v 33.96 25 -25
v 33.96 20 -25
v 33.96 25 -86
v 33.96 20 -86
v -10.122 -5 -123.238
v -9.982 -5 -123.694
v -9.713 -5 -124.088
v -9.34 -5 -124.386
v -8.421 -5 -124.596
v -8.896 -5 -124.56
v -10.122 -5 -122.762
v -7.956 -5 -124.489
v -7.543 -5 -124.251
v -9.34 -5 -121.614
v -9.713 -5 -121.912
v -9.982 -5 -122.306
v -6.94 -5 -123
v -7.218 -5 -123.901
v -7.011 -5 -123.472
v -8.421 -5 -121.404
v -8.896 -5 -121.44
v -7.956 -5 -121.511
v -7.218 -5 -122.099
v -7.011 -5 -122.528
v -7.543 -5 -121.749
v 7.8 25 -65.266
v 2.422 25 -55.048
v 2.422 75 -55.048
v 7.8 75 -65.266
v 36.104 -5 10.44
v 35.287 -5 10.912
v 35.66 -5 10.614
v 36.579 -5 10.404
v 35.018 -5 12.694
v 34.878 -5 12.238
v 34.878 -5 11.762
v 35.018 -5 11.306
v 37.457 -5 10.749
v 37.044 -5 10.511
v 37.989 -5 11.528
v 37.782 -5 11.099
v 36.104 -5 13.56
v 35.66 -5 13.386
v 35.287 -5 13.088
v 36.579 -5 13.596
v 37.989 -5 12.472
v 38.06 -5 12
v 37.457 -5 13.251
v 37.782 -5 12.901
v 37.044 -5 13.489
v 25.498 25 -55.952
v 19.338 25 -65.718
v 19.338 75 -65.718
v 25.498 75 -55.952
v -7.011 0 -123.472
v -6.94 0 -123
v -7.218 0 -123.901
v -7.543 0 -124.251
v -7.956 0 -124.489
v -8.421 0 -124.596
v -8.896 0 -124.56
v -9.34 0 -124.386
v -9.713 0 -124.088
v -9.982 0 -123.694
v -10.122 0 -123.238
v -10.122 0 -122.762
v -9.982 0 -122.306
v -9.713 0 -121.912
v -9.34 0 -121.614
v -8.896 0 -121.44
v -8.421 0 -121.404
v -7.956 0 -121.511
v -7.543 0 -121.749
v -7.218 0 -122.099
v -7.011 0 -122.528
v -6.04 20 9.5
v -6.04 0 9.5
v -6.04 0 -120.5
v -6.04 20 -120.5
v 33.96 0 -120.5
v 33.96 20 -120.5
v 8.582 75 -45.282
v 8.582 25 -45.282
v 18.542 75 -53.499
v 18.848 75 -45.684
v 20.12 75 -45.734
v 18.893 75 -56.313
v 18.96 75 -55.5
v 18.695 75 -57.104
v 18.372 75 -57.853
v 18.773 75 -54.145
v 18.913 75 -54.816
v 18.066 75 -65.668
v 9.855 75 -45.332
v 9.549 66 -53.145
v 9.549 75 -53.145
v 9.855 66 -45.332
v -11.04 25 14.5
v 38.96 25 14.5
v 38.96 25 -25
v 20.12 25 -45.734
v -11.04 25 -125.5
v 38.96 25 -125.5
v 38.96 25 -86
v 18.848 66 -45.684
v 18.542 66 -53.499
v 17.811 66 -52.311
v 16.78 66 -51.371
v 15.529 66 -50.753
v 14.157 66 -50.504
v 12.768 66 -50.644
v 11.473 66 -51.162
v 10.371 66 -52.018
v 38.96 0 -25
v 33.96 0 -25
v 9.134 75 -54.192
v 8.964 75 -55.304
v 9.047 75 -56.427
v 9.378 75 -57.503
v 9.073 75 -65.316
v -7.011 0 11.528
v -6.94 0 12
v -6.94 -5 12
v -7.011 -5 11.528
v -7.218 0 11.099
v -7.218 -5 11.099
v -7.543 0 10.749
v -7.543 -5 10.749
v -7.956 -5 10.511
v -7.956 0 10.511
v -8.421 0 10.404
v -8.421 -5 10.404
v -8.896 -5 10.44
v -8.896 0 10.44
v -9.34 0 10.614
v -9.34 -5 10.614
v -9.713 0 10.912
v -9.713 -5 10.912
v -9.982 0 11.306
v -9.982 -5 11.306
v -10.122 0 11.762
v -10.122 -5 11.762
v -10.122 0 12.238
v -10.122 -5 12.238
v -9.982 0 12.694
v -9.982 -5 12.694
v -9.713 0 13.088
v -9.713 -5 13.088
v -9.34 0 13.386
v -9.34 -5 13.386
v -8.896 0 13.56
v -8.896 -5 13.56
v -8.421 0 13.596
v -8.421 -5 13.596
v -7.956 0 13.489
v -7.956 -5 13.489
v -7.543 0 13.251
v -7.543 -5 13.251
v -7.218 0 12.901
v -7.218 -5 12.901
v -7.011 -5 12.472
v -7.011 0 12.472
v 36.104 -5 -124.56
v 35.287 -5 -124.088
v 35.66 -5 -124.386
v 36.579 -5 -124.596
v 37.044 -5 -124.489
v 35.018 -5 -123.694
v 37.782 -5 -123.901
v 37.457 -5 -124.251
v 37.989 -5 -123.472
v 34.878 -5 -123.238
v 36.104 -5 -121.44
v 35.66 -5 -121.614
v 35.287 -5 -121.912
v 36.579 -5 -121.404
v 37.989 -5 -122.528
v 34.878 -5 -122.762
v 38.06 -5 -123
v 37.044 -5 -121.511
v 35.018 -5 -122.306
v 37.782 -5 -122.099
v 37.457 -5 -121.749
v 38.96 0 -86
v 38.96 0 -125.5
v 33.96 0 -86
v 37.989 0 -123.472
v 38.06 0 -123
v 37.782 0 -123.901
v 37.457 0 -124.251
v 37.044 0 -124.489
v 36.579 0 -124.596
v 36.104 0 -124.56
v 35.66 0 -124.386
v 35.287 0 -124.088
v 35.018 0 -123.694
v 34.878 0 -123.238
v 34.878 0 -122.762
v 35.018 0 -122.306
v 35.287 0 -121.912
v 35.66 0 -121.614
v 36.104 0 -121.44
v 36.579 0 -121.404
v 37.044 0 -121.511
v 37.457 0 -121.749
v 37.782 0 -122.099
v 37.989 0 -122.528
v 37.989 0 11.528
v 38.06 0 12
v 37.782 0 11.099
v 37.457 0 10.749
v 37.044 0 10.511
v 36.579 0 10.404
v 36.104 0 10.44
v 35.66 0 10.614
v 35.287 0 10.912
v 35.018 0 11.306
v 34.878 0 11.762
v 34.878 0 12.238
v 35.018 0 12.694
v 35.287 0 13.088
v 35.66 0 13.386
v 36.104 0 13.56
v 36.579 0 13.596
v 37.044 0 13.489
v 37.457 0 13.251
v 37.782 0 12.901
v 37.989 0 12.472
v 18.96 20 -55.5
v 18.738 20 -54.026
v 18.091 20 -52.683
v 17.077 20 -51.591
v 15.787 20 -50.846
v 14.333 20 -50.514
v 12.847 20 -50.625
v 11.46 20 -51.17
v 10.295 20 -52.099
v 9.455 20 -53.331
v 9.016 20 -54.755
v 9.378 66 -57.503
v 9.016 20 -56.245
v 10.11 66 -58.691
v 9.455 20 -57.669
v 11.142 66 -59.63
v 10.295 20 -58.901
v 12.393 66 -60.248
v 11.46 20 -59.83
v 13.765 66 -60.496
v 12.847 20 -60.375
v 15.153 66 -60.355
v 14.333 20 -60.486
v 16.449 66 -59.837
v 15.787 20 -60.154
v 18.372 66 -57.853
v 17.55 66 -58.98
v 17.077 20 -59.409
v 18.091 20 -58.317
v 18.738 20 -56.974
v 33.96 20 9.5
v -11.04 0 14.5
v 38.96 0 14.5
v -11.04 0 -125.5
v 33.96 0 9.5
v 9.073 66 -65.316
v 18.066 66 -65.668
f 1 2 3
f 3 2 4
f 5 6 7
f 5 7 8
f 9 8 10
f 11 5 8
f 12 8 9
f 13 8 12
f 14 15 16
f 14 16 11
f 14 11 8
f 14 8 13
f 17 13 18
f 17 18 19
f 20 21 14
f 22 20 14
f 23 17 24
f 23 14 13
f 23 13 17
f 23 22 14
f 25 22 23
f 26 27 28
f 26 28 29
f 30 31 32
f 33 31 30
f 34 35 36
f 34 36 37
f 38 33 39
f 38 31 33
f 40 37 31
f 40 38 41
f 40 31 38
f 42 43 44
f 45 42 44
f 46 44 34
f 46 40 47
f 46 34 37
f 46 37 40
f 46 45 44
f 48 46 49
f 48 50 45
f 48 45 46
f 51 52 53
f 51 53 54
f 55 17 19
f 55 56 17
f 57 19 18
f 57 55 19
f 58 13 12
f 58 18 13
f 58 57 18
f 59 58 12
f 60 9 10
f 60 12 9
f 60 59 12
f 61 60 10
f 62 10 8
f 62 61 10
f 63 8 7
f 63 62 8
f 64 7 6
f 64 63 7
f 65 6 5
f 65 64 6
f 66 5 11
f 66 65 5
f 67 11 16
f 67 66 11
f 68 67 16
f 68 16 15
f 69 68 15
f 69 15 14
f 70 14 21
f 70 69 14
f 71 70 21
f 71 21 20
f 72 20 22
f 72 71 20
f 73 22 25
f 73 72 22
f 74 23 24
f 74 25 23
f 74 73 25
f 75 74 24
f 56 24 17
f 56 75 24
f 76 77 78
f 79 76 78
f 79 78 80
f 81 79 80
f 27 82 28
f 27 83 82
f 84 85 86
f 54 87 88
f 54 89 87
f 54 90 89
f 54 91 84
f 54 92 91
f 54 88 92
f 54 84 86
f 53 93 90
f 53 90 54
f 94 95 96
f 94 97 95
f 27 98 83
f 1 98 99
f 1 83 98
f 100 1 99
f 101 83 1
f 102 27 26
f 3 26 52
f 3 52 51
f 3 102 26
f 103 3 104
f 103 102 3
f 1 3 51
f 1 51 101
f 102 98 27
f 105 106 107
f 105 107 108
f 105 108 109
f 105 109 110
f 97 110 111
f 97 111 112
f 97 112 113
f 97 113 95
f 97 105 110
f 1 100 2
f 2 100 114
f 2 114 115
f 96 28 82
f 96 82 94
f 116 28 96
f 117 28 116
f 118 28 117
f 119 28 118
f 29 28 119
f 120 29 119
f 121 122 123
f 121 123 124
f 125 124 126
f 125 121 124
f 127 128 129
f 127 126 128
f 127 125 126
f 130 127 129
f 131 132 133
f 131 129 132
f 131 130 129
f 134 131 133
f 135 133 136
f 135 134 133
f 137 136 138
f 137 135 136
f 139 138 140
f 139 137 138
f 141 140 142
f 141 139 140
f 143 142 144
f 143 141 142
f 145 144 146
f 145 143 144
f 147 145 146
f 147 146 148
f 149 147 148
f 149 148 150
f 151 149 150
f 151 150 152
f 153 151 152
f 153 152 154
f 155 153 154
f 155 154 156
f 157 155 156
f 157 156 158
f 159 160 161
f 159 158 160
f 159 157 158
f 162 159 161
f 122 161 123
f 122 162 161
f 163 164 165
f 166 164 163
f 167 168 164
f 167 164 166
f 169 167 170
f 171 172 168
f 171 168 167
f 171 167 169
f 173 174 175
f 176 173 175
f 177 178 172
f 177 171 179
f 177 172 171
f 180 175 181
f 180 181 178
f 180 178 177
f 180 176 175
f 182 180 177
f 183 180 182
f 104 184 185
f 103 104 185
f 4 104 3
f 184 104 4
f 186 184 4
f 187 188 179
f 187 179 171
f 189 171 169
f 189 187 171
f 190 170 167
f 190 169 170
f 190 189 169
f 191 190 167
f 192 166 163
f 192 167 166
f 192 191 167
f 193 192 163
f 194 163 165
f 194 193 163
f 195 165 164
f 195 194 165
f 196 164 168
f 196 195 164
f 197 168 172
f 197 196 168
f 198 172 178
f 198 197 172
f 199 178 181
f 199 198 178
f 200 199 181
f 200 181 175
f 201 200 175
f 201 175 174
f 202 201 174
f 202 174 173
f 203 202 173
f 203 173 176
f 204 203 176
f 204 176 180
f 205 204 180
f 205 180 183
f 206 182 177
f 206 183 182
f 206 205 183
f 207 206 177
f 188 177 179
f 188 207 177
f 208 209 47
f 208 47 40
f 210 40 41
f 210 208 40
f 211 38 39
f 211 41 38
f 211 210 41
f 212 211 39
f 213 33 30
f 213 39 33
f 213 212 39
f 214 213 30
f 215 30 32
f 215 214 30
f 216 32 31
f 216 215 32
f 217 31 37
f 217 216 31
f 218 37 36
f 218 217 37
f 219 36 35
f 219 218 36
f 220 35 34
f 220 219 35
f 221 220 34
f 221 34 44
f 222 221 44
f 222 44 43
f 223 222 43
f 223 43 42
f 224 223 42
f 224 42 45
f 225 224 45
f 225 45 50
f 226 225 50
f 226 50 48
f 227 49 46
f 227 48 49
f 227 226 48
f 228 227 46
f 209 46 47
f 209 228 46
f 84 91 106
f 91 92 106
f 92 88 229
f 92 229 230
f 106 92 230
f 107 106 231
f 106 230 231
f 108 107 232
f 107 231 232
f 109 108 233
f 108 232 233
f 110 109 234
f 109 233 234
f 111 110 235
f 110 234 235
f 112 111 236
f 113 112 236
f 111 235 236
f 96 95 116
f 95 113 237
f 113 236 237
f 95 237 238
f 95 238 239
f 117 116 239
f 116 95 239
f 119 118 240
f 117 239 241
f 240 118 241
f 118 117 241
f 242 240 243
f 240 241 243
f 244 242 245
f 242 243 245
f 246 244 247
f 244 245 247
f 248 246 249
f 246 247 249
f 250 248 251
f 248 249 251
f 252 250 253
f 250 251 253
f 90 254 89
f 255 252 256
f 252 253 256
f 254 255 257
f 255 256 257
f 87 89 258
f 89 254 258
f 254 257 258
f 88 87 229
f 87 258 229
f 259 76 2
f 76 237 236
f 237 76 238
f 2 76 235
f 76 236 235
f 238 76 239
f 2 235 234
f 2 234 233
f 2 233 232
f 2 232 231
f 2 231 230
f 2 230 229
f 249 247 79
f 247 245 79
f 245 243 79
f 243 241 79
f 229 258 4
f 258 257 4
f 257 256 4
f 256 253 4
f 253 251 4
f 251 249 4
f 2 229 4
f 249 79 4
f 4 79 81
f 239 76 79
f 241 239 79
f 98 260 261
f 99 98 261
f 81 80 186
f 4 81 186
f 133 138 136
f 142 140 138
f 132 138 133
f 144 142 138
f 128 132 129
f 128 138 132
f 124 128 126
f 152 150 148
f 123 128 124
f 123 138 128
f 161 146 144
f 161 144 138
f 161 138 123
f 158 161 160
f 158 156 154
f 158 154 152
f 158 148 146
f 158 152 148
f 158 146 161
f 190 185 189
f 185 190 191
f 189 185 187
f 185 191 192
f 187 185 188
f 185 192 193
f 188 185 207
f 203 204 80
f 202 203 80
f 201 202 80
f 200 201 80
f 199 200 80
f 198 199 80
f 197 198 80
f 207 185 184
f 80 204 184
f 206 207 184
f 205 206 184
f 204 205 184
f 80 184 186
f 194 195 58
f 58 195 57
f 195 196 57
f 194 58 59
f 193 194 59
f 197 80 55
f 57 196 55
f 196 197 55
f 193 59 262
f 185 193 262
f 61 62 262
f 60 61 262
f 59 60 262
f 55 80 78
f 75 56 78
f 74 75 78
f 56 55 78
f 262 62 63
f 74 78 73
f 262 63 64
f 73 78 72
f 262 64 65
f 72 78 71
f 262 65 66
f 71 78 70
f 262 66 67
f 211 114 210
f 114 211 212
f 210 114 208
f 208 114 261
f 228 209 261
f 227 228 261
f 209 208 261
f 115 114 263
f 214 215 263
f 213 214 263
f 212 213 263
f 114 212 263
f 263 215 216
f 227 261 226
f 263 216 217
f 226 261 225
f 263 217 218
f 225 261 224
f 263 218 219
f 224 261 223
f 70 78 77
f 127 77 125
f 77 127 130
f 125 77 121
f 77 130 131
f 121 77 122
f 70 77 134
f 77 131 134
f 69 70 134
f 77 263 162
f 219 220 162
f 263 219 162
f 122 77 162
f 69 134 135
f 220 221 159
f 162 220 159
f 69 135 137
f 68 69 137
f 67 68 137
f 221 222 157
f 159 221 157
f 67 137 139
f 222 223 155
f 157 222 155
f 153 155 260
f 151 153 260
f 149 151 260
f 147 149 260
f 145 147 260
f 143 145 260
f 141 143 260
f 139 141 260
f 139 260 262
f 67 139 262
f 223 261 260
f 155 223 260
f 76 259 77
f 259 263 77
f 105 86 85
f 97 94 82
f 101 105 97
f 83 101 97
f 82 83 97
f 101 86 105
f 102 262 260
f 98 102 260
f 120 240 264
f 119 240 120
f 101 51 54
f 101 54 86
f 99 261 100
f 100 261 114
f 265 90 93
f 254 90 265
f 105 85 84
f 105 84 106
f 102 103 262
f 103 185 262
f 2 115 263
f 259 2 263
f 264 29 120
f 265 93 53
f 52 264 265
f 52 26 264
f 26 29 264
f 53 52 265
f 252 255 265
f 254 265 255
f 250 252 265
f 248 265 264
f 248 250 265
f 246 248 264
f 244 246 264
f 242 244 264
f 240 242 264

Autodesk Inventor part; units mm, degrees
ref_plane "YZ Plane" through (0, 0, 0) normal (1, 0, 0) x (0, 1, 0)
ref_plane "XZ Plane" through (0, 0, 0) normal (0, 1, 0) x (-1, 0, 0)
ref_plane "XY Plane" through (0, 0, 0) normal (0, 0, 1) x (1, 0, 0)
sketch "Sketch1" plane through (0, 0, 0) normal (0, 1, 0) x (-1, 0, 0)
  point P0 (0, 0)
sketch "Sketch2" plane through (0, 0, 0) normal (0, 1, 0) x (-1, 0, 0)
  line L0 (11.0402, 14.5) -> (-38.9598, 14.5)
  line L1 (-38.9598, -125.5) -> (11.0402, -125.5)
  line L2 (11.0402, -125.5) -> (11.0402, 14.5)
  line L3 (-38.9598, -25) -> (-33.9598, -25)
  line L4 (-38.9598, -86) -> (-33.9598, -86)
  line L5 (-38.9598, 14.5) -> (-38.9598, -25)
  line L6 (-38.9598, -86) -> (-38.9598, -125.5)
  line L7 (-33.9598, -25) -> (-33.9598, 9.5)
  line L8 (-33.9598, 9.5) -> (6.0402, 9.5)
  line L9 (6.0402, 9.5) -> (6.0402, -120.5)
  line L10 (6.0402, -120.5) -> (-33.9598, -120.5)
  line L11 (-33.9598, -120.5) -> (-33.9598, -86)
  point P0 (0, 0)
  dimension "d0" = 50
  dimension "d1" = 140
  dimension "d2" = 5
  dimension "d3" = 39.5
  dimension "d4" = 39.5
  dimension "d5" = 34.5
  dimension "d6" = 40
  dimension "d7" = 130
extrude "Extrusion1" add sketch "Sketch2" along normal blind 20
sketch "Sketch3" plane through (0, 20, 0) normal (0, 1, 0) x (1, 0, 0)
  line L0 (-11.0402, 125.5) -> (-11.0402, -14.5) projected
  line L1 (38.9598, 125.5) -> (-11.0402, 125.5) projected
  line L2 (-11.0402, -14.5) -> (38.9598, -14.5)
  line L3 (38.9598, 125.5) -> (-11.0402, 125.5)
  line L4 (-11.0402, 125.5) -> (-11.0402, -14.5)
  line L5 (33.9598, 86) -> (38.9598, 86) projected
  line L6 (38.9598, 25) -> (33.9598, 25) projected
  line L7 (33.9598, 25) -> (33.9598, -9.5) projected
  line L8 (33.9598, 25) -> (33.9598, 86)
  line L9 (38.9598, -14.5) -> (38.9598, 25)
  line L10 (38.9598, 86) -> (38.9598, 125.5)
  point P0 (0, 0)
extrude "Extrusion2" add sketch "Sketch3" along normal blind 5
sketch "Sketch4" plane through (0, 25, 0) normal (0, 1, 0) x (1, 0, 0)
  circle A0 centre (13.9598, 55.5) radius 5
  line L0 (-11.0402, -14.5) -> (38.9598, -14.5) projected
  line L1 (38.9598, 86) -> (38.9598, 125.5) projected
  point P0 (0, 0)
  dimension "d12" = 10
  dimension "d13" = 70
  dimension "d14" = 25
extrude "Extrusion3" cut sketch "Sketch4" against normal blind 5
sketch "Sketch5" plane through (0, 0, 0) normal (0, -1, 0) x (1, 0, 0)
  circle A0 centre (36.4598, 12) radius 1.6
  line L0 (38.9598, 14.5) -> (38.9598, -25) projected
  line L1 (-11.0402, 14.5) -> (38.9598, 14.5) projected
  circle A1 centre (36.4598, -123) radius 1.6
  line L2 (38.9598, -125.5) -> (-11.0402, -125.5) projected
  line L3 (38.9598, -86) -> (38.9598, -125.5) projected
  circle A2 centre (-8.5402, -123) radius 1.6
  line L4 (-11.0402, -125.5) -> (-11.0402, 14.5) projected
  circle A3 centre (-8.5402, 12) radius 1.6
  point P0 (0, 0)
  dimension "d17" = 3.2
  dimension "d18" = 2.5
  dimension "d19" = 2.5
  dimension "d20" = 3.2
  dimension "d21" = 2.5
  dimension "d22" = 2.5
  dimension "d23" = 3.2
  dimension "d24" = 2.5
  dimension "d25" = 2.5
  dimension "d26" = 3.2
  dimension "d27" = 2.5
  dimension "d28" = 2.5
extrude "Extrusion4" add sketch "Sketch5" along normal blind 5
sketch "Sketch6" plane through (0, 25, 0) normal (0, 1, 0) x (1, 0, 0)
  circle A0 centre (13.9598, 55.5) radius 5 projected
  line L0 (8.5818, 45.2818) -> (2.4216, 55.0484)
  line L1 (2.4216, 55.0484) -> (7.7996, 65.2665)
  line L2 (7.7996, 65.2665) -> (19.3378, 65.7182)
  line L3 (19.3378, 65.7182) -> (25.498, 55.9516)
  line L4 (25.498, 55.9516) -> (20.12, 45.7335)
  line L5 (20.12, 45.7335) -> (8.5818, 45.2818)
  point P0 (0, 0)
  dimension "d31" = 10
extrude "Extrusion5" add sketch "Sketch6" along normal blind 50
sketch "Sketch7" plane through (20.12, 25, -45.7335) normal (0.0391109, 0, 0.9992349) x (0.9992349, 0, -0.0391109)
  point P0 (-21.8933, -25)
sketch "Sketch8" plane through (20.12, 25, -45.7335) normal (0.0391109, 0, 0.9992349) x (0.9992349, 0, -0.0391109)
  line L0 (-10.7735, 50) -> (-0.7735, 50) projected
  line L1 (-10.273, 50) -> (-1.273, 50)
  line L2 (-1.273, 50) -> (-1.273, 41)
  line L3 (-1.273, 41) -> (-10.273, 41)
  line L4 (-10.273, 41) -> (-10.273, 50)
  line L5 (0, 0) -> (0, 50) projected
  line L6 (-11.547, 0) -> (-11.547, 50) projected
  point P0 (-21.8933, -25)
  point P1 (-1.273, 50)
  dimension "d34" = 9
  dimension "d35" = 9
  dimension "d36" = 1.273
  dimension "d37" = 1.274
extrude "Extrusion6" cut sketch "Sketch8" against normal through all
properties part number "Caja_Antena"
